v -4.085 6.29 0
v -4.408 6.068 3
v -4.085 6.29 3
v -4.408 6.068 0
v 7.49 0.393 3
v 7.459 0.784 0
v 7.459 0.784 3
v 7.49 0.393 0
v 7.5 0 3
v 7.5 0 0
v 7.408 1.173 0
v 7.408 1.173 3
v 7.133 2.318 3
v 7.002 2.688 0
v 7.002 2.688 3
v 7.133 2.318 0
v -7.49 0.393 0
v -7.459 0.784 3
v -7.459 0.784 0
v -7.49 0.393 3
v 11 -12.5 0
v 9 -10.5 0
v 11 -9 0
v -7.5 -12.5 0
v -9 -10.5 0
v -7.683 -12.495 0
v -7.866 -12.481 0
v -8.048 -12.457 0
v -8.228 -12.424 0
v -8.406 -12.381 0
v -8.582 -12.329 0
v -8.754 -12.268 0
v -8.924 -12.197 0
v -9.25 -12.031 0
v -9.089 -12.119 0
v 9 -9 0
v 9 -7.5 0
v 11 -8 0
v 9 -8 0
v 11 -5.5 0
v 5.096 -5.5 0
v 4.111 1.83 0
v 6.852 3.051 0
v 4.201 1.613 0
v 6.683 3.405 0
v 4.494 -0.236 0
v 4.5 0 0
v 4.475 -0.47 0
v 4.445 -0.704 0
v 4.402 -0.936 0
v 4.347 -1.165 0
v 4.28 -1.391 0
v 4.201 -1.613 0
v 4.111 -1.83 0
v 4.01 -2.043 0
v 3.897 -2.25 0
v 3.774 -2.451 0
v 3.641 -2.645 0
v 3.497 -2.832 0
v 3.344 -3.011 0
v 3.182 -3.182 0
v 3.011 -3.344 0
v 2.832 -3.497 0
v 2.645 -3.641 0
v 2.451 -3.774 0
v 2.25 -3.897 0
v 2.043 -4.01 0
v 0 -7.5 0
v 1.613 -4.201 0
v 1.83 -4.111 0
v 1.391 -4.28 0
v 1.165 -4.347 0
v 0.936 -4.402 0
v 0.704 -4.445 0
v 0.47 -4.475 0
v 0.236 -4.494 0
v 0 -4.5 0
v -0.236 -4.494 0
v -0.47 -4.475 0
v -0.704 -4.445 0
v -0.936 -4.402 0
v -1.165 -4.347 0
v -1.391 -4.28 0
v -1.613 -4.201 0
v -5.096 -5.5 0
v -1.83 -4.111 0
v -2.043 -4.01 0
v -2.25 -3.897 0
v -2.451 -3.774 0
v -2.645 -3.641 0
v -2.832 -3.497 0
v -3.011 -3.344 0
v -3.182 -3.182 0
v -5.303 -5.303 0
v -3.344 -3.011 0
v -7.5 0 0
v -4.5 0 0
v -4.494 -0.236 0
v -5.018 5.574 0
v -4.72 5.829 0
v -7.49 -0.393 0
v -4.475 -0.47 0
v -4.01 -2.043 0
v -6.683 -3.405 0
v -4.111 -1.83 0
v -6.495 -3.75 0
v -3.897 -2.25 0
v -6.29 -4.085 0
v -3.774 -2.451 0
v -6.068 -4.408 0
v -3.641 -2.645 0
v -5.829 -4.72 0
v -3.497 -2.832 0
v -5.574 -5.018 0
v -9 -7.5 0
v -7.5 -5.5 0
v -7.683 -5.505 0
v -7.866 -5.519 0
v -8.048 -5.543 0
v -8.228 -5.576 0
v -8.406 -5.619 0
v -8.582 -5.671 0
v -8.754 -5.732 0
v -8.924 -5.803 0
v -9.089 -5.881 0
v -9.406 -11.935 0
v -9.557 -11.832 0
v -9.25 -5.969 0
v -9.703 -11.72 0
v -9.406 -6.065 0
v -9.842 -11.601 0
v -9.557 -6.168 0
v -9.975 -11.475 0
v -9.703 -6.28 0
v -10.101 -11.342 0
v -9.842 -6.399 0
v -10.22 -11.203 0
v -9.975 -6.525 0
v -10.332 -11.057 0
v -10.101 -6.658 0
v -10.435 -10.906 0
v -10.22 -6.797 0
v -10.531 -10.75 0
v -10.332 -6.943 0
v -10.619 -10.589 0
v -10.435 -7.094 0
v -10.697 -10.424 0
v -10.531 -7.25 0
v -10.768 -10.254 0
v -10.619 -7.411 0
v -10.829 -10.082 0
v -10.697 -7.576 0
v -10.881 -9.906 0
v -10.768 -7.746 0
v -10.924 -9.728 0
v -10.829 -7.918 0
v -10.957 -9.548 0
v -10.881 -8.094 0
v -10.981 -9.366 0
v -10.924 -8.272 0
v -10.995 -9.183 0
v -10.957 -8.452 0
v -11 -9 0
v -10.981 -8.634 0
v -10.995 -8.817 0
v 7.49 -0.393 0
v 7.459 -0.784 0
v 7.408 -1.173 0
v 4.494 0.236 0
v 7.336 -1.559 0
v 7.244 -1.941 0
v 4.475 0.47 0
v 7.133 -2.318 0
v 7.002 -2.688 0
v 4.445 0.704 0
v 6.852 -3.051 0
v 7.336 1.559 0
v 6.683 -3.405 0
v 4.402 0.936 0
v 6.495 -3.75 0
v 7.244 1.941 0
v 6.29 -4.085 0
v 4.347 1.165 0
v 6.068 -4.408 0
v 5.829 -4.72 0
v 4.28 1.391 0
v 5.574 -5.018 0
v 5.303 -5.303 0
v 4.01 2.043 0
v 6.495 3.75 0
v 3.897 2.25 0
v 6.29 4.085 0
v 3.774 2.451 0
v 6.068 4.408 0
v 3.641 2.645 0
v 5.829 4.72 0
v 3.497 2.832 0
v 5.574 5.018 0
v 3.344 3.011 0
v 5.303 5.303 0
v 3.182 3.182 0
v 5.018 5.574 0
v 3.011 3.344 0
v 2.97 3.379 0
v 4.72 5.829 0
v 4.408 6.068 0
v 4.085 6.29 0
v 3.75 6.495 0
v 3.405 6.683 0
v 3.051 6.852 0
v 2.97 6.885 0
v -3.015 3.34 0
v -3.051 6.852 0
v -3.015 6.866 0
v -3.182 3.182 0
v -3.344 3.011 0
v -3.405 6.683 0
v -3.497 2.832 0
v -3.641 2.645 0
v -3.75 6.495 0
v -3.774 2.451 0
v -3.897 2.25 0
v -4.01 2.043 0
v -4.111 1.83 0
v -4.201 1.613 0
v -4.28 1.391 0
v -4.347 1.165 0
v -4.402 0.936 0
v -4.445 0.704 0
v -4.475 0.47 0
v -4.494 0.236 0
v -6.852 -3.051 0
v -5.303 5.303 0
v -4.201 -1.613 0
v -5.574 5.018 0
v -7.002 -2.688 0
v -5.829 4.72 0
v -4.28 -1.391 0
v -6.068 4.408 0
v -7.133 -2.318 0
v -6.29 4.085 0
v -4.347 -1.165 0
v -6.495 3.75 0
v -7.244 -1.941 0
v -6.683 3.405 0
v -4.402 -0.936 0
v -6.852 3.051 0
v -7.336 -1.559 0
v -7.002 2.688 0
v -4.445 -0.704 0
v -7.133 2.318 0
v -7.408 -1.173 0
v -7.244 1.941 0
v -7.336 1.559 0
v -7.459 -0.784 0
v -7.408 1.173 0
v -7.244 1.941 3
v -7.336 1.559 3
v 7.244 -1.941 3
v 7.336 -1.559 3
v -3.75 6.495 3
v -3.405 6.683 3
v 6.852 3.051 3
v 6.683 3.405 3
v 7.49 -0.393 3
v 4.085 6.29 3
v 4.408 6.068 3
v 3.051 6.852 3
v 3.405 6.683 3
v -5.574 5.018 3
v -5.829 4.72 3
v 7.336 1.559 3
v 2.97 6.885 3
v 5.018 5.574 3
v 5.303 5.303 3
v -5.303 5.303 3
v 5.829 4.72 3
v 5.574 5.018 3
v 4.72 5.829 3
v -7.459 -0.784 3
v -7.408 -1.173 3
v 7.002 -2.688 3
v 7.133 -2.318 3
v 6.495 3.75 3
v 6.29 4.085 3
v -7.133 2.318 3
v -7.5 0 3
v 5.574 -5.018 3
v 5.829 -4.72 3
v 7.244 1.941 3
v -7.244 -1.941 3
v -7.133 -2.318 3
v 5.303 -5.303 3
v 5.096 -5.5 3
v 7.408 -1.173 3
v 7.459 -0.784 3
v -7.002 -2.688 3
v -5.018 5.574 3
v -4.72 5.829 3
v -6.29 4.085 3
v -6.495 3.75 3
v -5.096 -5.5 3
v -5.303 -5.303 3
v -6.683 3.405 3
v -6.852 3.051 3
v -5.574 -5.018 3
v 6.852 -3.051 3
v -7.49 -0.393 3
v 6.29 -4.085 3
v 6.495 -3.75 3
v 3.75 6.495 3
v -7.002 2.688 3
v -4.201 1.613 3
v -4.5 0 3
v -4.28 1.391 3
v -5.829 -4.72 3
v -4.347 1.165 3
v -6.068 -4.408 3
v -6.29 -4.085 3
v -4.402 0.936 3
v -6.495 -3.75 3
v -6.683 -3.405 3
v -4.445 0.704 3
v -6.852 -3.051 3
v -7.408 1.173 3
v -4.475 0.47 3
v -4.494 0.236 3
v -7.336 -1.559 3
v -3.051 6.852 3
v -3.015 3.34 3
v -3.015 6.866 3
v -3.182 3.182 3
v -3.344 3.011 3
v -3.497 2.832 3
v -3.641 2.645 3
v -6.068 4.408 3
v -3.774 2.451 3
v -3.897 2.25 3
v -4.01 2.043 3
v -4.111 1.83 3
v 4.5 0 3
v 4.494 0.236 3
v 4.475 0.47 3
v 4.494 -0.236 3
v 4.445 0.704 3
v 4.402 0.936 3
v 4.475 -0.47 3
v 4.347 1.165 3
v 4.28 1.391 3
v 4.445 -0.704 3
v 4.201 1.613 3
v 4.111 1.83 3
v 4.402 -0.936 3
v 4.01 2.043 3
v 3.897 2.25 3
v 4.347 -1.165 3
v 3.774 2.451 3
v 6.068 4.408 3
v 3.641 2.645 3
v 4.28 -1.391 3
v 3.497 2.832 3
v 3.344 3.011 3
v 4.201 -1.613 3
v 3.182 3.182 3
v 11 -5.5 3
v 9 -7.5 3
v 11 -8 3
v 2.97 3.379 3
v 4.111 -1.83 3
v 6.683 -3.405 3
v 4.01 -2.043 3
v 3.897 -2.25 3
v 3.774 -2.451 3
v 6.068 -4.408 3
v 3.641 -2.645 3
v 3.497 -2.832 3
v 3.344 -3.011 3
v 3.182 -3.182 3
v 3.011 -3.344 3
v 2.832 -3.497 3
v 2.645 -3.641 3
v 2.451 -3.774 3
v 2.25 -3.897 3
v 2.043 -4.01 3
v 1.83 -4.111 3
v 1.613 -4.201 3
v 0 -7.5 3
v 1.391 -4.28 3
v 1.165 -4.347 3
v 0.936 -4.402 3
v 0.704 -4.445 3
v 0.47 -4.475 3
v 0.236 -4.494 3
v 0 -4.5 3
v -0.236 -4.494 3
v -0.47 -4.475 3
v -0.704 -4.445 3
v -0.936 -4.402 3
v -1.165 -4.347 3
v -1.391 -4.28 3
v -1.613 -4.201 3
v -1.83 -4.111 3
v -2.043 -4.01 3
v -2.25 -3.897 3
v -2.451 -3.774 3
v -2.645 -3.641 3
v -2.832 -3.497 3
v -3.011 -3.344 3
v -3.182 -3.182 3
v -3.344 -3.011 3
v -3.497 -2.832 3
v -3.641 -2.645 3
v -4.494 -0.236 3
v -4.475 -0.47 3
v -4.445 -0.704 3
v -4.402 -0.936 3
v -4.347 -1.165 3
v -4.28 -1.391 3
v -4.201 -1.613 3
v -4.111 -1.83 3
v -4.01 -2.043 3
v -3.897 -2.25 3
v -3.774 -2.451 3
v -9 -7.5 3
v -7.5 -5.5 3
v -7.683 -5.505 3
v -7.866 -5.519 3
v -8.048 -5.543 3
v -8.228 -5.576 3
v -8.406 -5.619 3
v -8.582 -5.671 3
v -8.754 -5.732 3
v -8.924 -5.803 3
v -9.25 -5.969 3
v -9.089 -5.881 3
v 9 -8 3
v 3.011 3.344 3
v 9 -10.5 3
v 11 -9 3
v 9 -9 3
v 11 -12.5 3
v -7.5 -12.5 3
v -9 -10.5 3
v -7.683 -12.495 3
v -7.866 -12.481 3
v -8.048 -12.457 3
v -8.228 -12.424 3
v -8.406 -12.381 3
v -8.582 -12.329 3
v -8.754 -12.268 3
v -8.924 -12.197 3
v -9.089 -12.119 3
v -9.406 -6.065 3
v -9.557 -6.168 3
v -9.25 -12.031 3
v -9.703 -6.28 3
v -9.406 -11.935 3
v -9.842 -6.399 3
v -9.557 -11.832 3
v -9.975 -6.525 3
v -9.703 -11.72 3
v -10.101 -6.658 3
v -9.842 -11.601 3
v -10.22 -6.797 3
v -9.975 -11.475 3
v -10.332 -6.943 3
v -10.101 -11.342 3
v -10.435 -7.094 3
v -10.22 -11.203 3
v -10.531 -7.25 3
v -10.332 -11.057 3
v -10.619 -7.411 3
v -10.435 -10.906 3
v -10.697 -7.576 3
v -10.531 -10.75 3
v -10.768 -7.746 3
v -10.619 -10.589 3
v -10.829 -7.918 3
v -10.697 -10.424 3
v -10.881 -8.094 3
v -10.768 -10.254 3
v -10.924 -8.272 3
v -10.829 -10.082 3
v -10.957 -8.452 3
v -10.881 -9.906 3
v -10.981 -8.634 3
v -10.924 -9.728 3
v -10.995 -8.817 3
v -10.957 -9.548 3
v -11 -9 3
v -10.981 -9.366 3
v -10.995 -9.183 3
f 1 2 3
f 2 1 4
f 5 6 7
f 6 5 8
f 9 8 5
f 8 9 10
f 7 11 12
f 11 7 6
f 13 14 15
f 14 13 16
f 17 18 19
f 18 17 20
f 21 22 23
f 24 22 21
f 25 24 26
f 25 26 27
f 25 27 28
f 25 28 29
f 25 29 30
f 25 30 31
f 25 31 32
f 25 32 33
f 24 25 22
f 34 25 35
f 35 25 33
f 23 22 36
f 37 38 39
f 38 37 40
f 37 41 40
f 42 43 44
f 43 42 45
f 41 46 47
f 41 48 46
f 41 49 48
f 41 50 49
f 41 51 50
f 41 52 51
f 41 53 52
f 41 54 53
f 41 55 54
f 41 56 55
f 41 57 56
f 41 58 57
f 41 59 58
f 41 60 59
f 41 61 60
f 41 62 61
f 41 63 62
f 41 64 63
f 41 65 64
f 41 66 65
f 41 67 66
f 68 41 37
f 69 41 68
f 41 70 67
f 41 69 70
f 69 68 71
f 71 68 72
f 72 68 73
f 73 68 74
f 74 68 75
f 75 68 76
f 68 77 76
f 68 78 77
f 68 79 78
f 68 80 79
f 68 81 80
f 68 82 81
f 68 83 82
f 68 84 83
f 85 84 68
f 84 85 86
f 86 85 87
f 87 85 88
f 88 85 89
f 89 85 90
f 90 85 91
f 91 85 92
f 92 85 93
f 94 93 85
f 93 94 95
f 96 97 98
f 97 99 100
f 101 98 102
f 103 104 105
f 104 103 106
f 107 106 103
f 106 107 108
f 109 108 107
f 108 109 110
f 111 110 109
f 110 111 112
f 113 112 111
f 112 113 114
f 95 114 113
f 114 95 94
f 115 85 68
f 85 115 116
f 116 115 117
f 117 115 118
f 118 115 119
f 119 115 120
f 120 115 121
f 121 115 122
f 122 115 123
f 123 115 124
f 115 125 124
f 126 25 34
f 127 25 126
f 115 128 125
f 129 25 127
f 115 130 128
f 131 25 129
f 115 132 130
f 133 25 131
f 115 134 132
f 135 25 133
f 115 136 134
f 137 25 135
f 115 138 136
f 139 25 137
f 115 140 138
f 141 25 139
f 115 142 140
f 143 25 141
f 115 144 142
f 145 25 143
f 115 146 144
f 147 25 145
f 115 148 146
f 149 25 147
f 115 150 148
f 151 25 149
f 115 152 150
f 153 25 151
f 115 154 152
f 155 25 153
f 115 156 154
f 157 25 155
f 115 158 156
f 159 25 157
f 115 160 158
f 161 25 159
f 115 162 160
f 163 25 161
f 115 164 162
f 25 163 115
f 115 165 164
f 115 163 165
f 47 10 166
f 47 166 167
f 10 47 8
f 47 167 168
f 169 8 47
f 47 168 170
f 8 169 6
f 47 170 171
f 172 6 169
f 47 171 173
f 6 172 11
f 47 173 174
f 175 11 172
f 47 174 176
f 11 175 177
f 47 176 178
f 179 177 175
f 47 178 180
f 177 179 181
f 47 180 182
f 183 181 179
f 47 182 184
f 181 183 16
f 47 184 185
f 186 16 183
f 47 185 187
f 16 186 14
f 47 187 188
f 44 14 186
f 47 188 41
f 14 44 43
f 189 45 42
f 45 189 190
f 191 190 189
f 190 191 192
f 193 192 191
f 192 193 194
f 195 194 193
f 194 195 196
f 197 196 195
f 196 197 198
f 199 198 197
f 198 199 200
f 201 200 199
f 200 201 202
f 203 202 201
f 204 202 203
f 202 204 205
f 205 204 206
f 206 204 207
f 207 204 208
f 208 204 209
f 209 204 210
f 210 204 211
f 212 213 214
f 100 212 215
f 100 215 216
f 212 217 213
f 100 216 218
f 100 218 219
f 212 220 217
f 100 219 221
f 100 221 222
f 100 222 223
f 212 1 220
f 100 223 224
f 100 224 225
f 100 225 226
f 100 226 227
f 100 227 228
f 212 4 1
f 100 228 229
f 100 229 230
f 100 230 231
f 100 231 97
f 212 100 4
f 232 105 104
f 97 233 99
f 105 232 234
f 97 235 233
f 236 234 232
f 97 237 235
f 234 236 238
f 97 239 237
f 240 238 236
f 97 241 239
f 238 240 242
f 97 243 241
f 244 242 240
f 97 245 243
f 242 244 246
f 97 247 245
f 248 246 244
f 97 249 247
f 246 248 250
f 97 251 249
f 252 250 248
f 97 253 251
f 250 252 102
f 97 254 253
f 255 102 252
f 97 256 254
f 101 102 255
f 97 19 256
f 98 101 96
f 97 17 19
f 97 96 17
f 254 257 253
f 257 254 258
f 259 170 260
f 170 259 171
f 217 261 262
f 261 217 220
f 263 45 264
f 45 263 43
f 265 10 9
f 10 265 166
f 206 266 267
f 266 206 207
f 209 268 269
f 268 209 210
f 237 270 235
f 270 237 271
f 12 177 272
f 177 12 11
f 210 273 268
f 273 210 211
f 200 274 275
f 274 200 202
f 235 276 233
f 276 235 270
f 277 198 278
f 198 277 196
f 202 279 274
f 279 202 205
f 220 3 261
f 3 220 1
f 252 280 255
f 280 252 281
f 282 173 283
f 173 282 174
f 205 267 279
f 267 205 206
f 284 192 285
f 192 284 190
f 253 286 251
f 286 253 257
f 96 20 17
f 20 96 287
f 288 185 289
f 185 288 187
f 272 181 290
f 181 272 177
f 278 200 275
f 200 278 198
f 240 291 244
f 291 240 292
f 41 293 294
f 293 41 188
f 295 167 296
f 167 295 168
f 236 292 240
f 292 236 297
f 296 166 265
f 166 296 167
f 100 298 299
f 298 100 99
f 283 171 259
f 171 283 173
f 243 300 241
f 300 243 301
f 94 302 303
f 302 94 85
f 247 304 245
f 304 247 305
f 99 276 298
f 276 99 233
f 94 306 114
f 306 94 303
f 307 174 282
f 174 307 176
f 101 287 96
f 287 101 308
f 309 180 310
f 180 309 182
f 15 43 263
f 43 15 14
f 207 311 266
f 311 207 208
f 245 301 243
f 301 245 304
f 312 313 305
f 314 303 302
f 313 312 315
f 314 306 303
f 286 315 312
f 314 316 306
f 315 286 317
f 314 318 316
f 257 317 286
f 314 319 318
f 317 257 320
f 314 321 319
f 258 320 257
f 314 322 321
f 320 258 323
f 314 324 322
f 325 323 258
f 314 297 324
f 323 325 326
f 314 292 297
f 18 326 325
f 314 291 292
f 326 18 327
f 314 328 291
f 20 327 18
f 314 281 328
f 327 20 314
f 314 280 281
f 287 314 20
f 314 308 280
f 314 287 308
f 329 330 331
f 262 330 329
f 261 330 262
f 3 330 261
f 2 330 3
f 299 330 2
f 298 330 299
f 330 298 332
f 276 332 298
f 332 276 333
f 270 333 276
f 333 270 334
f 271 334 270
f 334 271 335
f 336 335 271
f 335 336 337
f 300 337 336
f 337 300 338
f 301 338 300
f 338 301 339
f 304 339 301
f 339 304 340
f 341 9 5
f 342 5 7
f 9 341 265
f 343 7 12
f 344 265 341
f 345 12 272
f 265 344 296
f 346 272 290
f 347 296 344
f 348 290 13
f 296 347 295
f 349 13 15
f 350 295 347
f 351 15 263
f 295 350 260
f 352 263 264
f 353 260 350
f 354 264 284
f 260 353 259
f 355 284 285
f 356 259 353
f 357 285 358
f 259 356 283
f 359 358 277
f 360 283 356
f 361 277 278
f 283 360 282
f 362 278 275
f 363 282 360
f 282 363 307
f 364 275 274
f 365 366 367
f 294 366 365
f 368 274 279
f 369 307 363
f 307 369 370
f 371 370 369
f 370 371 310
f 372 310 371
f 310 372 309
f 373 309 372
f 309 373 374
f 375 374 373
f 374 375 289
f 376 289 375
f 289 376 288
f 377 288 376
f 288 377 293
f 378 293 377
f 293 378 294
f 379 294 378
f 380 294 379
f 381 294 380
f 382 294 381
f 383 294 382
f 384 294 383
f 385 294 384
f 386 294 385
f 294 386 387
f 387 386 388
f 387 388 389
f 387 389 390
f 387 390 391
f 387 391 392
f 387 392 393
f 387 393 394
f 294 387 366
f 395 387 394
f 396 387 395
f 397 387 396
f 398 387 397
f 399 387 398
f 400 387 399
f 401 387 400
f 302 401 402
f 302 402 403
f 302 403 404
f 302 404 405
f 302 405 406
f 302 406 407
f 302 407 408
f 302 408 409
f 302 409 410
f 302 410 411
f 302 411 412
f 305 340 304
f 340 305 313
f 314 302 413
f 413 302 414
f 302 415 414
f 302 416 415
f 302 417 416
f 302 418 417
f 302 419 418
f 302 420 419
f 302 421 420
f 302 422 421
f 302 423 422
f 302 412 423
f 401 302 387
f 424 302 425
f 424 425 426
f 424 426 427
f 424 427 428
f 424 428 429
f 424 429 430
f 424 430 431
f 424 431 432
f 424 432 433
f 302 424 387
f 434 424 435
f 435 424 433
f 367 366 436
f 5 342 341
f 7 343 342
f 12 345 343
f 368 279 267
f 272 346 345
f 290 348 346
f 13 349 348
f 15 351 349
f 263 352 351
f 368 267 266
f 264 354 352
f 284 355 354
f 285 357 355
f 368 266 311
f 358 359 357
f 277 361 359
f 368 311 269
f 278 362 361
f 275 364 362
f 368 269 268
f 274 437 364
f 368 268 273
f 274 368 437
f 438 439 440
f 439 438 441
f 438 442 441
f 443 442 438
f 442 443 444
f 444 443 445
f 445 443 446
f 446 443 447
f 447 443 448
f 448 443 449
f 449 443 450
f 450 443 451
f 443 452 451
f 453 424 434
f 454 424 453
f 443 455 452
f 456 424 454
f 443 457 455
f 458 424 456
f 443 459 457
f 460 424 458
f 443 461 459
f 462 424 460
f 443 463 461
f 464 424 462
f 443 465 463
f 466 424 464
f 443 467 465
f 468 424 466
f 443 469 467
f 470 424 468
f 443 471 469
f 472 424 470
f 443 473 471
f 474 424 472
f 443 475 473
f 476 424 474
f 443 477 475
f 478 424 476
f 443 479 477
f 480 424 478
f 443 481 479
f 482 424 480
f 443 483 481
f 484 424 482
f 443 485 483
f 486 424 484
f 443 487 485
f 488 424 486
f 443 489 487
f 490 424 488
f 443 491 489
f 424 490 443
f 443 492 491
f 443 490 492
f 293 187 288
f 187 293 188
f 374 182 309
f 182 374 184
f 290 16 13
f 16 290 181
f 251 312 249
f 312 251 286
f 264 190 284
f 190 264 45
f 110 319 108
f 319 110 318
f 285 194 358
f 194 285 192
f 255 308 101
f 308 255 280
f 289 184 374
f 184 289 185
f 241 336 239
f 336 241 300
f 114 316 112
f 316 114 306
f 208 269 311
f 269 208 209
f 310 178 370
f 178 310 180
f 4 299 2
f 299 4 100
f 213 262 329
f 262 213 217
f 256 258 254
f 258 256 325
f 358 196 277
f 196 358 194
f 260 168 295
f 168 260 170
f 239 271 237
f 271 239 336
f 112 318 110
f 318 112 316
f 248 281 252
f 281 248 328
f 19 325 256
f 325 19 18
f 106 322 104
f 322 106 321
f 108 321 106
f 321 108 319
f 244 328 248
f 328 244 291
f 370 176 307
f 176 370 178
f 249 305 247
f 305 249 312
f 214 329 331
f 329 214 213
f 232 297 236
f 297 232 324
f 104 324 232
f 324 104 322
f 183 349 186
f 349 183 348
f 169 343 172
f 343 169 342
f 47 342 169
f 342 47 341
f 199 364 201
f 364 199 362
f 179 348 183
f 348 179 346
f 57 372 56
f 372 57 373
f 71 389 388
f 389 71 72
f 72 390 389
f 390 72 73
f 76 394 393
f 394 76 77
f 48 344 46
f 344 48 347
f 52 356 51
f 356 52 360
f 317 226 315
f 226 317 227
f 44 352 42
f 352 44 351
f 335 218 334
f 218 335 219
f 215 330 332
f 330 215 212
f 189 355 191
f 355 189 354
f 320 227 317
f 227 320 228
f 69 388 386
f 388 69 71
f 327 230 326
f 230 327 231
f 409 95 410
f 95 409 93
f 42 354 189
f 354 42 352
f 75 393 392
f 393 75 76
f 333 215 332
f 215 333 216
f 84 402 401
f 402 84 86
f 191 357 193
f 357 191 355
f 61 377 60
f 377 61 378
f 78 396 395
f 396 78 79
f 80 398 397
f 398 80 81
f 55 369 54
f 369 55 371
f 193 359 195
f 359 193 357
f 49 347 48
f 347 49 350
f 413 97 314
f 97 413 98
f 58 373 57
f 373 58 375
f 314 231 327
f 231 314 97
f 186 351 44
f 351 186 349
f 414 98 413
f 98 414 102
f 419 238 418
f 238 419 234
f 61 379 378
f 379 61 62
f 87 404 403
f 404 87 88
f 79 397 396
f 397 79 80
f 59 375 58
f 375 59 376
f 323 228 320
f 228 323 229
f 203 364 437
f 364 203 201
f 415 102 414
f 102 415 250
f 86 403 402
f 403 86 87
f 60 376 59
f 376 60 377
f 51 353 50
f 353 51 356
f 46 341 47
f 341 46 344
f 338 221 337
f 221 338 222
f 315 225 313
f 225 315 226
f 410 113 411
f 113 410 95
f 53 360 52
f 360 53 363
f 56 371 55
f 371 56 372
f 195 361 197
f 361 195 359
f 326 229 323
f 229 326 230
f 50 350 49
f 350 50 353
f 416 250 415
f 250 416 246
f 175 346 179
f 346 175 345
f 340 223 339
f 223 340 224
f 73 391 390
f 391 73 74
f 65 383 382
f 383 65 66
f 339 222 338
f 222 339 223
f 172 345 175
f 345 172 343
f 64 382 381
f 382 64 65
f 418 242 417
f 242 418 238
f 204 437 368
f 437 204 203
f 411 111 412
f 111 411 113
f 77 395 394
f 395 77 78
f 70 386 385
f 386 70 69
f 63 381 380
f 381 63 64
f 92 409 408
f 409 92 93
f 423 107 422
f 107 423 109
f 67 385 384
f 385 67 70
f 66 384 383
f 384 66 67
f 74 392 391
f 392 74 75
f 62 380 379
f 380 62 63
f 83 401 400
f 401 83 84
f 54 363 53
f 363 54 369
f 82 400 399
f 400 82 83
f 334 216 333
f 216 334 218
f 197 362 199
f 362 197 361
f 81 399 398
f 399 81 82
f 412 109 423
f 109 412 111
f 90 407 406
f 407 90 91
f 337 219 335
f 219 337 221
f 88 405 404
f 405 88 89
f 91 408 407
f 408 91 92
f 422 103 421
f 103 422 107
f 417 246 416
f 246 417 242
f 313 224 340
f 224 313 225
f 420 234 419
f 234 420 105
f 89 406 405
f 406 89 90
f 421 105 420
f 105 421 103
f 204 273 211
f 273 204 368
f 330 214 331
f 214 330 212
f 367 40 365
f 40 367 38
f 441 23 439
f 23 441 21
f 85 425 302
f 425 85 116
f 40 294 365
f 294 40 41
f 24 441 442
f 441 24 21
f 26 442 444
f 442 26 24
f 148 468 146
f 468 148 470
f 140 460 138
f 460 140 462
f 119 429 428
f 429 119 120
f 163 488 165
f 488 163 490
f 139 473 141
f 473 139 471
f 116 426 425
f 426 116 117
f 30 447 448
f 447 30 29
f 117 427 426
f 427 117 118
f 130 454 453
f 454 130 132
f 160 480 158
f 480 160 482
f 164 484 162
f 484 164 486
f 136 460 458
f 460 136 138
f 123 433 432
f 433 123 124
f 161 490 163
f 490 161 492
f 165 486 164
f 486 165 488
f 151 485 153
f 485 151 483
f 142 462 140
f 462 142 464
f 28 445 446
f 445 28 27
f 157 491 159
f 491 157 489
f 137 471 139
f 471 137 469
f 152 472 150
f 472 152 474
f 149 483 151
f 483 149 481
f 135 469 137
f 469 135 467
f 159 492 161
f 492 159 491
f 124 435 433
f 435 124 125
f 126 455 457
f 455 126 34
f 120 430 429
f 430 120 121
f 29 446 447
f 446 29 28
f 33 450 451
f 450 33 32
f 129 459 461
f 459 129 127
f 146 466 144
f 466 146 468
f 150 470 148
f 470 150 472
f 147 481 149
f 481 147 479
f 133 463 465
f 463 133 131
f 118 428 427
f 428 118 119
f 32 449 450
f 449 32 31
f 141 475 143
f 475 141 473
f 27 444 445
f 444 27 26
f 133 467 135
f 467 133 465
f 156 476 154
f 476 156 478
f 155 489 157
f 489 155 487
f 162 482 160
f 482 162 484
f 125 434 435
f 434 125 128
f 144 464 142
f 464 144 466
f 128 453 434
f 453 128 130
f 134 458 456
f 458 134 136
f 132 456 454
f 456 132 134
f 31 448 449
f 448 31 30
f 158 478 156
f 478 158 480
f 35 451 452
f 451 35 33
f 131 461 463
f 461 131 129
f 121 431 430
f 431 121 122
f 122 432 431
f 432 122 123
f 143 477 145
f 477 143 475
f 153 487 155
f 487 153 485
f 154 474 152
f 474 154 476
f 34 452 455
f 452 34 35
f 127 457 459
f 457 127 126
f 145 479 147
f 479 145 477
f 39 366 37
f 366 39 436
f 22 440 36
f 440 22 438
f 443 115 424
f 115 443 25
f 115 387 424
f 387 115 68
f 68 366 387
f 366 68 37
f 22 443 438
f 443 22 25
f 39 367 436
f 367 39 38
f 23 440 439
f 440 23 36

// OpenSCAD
cableWidth=16;  // in mm
rodDelimiter=10; // in mm

// No more changes from here

outerRadius=(rodDelimiter-1+6)/2;
innerRadius=(rodDelimiter-1)/2;

difference() {
    cylinder (r=outerRadius, h=3, $fn=120); 
    cylinder (r=innerRadius, h=3, $fn=120);
    translate ([innerRadius*-0.67, innerRadius/1.35, 0]) cube ([innerRadius*1.33, outerRadius-((rodDelimiter-1)/2.7), 3]);

    
}

difference() {
    union() {
        translate ([(cableWidth-1)/-2, (outerRadius-2+7)*-1, 0]) cube ([(cableWidth+2.5), 7, 3]);
        translate ([(cableWidth-1)/-2, (outerRadius-2+3.5)*-1, 0]) cylinder (r=3.5, h=3, $fn=120);
    }
    translate ([(cableWidth/2+1)*-1, (outerRadius-2+5)*-1, 0]) cube ([(cableWidth+2), 3, 3]);
    translate ([(cableWidth/2+1), (outerRadius-2+3.5)*-1, 0]) cube ([2, 1, 3]);
}
